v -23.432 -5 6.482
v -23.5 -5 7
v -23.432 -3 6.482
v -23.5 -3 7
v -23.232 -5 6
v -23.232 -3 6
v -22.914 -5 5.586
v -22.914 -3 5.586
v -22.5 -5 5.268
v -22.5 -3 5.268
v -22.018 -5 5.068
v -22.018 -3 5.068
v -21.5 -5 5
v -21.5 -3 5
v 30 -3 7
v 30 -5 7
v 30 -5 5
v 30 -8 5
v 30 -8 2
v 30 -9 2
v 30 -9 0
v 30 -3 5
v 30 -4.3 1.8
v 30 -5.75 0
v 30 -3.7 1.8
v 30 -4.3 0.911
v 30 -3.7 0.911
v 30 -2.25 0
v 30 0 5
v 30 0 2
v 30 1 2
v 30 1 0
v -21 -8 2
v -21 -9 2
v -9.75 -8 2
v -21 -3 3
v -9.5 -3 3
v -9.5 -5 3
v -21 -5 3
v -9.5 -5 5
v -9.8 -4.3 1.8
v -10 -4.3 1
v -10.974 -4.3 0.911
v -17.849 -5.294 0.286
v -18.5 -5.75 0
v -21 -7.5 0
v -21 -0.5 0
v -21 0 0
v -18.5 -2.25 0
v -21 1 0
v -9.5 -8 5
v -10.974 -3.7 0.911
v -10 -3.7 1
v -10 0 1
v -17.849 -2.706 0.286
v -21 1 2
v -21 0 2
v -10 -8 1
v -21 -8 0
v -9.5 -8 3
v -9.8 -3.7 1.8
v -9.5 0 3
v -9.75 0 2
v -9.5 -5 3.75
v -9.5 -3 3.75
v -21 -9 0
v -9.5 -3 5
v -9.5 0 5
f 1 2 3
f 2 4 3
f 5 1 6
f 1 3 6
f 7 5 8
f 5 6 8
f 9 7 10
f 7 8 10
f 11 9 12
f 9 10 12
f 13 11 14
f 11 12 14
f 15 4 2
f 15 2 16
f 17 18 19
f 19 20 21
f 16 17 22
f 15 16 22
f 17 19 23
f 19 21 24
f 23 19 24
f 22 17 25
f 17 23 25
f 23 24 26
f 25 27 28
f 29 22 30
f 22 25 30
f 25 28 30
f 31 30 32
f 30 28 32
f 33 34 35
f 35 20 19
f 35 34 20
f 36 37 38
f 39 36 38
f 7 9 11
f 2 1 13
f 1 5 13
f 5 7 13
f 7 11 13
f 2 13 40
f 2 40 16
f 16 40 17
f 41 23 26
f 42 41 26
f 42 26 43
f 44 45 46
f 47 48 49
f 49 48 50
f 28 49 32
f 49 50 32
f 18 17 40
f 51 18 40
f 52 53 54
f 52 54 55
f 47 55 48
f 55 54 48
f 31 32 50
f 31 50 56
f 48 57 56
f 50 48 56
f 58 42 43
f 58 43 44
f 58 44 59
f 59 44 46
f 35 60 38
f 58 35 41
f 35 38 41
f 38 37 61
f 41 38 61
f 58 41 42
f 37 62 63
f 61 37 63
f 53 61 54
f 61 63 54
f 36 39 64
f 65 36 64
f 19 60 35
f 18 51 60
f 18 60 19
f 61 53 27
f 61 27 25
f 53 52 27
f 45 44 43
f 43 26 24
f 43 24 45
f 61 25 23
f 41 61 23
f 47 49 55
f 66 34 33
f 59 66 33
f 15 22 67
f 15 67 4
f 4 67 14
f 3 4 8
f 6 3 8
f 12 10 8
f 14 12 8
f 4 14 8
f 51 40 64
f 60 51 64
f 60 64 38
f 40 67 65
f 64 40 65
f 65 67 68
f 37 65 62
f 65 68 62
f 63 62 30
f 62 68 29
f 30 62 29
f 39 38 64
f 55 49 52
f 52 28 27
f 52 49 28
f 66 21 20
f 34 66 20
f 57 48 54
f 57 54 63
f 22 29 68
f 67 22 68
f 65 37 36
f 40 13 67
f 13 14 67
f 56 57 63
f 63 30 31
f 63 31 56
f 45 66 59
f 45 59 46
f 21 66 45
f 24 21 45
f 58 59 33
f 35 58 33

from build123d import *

# Parameters (mm, degrees)
F0_W      = 30
F0_H      = 5
F1_DEPTH  = 8
F4_DEPTH  = 51.001
F5_DEPTH  = 5.001
F6_W      = 1
F6_H      = 2
F7_DEPTH  = 51
F8_W      = 2
F8_H      = 0.75
F9_DEPTH  = 11.5
F11_DEPTH = 6.001
F12_W     = 39.5
F12_H     = 2
F12_W_2   = 14
F13_DEPTH = 2
F14_R     = 1.99999


# Not quite as in the source:
# - a fillet or chamfer is up to 0.001 mm smaller than in the source, because OpenCascade refuses the exact size


with BuildPart() as f1:
    # F0 (on Front) → F1 (new body)
    with BuildSketch(Plane.XZ):
        Polygon((0, 0), (0, 5), (-9.5, 5), (-9.5, 3), (-10, 1), (-21, 0), align=None)
        with Locations((15, 2.5)):
            Rectangle(F0_W, F0_H)
    extrude(amount=F1_DEPTH)

    # F3 (on face) → F4 (cut, through all)
    with BuildSketch(Plane.YZ.offset(30)):
        Polygon((-3.7, 1.8), (-4.3, 1.8), (-4.3, 0.9114285714), (-4, 1.1), (-3.7, 0.9114285714), align=None)
        Polygon((-4.3, 0), (-4.3, 0.9114285714), (-5.75, 0), align=None)
        Polygon((-2.25, 0), (-3.7, 0.9114285714), (-3.7, 0), align=None)
        Polygon((-4, 1.1), (-4.3, 0.9114285714), (-4.3, 0), (-3.7, 0), (-3.7, 0.9114285714), align=None)
    extrude(amount=-F4_DEPTH, mode=Mode.SUBTRACT)

    # F2 (on face) → F5 (cut, through all)
    with BuildSketch(Plane(origin=(0, 0, 0), x_dir=(1, 0, 0), z_dir=(0, 0, -1))):
        Polygon((-16, 4), (-21, 7.5), (-21, 0.5), align=None)
    extrude(amount=-F5_DEPTH, mode=Mode.SUBTRACT)

    # F6 (on face) → F7 (join, through all)
    with BuildSketch(Plane.YZ.offset(30)):
        with Locations((-8.5, 1)):
            Rectangle(F6_W, F6_H)
        with Locations((0.5, 1)):
            Rectangle(F6_W, F6_H)
    extrude(amount=-F7_DEPTH)

    # F8 (on face) → F9 (join)
    with BuildSketch(Plane(origin=(-9.5, 0, 0), x_dir=(0, -1, 0), z_dir=(-1, 0, 0))):
        with Locations((4, 3.375)):
            Rectangle(F8_W, F8_H)
    extrude(amount=F9_DEPTH)

    # F10 (on face) → F11 (cut, through all)
    with BuildSketch(Plane.XZ.offset(5)):
        Polygon((-21, 3.75), (-21, 3), (-9.5, 3.75), align=None)
    extrude(amount=-F11_DEPTH, mode=Mode.SUBTRACT)

    # F12 (on face) → F13 (join)
    with BuildSketch(Plane.XY.offset(5)):
        with Locations((10.25, -4)):
            Rectangle(F12_W, F12_H)
        with Locations((-16.5, -4)):
            Rectangle(F12_W_2, F12_H)
    extrude(amount=F13_DEPTH)

    # F14 (radius 2 in the source; OpenCascade refuses exactly that, so slightly less here)
    f14_edges = [f1.edges().sort_by_distance(p)[0] for p in [
        (-23.5, -4, 5),
    ]]
    fillet(f14_edges, radius=F14_R)


solid = f1.part
